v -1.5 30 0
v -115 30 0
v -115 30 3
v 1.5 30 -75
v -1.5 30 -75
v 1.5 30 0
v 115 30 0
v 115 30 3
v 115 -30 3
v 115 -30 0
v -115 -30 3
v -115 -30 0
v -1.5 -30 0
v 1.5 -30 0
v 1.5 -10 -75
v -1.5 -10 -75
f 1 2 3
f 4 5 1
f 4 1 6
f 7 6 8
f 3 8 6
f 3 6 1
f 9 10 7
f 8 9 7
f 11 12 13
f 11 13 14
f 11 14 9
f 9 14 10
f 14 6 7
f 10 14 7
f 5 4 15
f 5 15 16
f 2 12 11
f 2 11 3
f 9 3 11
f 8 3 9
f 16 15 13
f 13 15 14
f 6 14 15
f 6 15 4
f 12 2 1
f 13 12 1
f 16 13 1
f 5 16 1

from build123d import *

# Parameters (mm, degrees)
SKETCH1_W           = 230
SKETCH1_H           = 60
BOSS_EXTRUDE1_DEPTH = 3
SKETCH2_W           = 3
SKETCH2_H           = 60
BOSS_EXTRUDE2_DEPTH = 75
CUT_EXTRUDE1_DEPTH  = 75


with BuildPart() as part:
    # Sketch1 → Boss-Extrude1 (new body)
    with BuildSketch(Plane.XY):
        Rectangle(SKETCH1_W, SKETCH1_H)
    extrude(amount=BOSS_EXTRUDE1_DEPTH)

    # Sketch2 → Boss-Extrude2 (add)
    with BuildSketch(Plane(origin=(0, 0, 0), x_dir=(-1, 0, 0), z_dir=(0, 0, -1))):
        Rectangle(SKETCH2_W, SKETCH2_H)
    extrude(amount=BOSS_EXTRUDE2_DEPTH)

    # Sketch3 → Cut-Extrude1 (cut)
    with BuildSketch(Plane(origin=(1.5, 0, 0), x_dir=(0, 0, -1), z_dir=(1, 0, 0))):
        Polygon((75, -10), (0, -30), (75, -30), align=None)
    extrude(amount=-CUT_EXTRUDE1_DEPTH, mode=Mode.SUBTRACT)


solid = part.part
